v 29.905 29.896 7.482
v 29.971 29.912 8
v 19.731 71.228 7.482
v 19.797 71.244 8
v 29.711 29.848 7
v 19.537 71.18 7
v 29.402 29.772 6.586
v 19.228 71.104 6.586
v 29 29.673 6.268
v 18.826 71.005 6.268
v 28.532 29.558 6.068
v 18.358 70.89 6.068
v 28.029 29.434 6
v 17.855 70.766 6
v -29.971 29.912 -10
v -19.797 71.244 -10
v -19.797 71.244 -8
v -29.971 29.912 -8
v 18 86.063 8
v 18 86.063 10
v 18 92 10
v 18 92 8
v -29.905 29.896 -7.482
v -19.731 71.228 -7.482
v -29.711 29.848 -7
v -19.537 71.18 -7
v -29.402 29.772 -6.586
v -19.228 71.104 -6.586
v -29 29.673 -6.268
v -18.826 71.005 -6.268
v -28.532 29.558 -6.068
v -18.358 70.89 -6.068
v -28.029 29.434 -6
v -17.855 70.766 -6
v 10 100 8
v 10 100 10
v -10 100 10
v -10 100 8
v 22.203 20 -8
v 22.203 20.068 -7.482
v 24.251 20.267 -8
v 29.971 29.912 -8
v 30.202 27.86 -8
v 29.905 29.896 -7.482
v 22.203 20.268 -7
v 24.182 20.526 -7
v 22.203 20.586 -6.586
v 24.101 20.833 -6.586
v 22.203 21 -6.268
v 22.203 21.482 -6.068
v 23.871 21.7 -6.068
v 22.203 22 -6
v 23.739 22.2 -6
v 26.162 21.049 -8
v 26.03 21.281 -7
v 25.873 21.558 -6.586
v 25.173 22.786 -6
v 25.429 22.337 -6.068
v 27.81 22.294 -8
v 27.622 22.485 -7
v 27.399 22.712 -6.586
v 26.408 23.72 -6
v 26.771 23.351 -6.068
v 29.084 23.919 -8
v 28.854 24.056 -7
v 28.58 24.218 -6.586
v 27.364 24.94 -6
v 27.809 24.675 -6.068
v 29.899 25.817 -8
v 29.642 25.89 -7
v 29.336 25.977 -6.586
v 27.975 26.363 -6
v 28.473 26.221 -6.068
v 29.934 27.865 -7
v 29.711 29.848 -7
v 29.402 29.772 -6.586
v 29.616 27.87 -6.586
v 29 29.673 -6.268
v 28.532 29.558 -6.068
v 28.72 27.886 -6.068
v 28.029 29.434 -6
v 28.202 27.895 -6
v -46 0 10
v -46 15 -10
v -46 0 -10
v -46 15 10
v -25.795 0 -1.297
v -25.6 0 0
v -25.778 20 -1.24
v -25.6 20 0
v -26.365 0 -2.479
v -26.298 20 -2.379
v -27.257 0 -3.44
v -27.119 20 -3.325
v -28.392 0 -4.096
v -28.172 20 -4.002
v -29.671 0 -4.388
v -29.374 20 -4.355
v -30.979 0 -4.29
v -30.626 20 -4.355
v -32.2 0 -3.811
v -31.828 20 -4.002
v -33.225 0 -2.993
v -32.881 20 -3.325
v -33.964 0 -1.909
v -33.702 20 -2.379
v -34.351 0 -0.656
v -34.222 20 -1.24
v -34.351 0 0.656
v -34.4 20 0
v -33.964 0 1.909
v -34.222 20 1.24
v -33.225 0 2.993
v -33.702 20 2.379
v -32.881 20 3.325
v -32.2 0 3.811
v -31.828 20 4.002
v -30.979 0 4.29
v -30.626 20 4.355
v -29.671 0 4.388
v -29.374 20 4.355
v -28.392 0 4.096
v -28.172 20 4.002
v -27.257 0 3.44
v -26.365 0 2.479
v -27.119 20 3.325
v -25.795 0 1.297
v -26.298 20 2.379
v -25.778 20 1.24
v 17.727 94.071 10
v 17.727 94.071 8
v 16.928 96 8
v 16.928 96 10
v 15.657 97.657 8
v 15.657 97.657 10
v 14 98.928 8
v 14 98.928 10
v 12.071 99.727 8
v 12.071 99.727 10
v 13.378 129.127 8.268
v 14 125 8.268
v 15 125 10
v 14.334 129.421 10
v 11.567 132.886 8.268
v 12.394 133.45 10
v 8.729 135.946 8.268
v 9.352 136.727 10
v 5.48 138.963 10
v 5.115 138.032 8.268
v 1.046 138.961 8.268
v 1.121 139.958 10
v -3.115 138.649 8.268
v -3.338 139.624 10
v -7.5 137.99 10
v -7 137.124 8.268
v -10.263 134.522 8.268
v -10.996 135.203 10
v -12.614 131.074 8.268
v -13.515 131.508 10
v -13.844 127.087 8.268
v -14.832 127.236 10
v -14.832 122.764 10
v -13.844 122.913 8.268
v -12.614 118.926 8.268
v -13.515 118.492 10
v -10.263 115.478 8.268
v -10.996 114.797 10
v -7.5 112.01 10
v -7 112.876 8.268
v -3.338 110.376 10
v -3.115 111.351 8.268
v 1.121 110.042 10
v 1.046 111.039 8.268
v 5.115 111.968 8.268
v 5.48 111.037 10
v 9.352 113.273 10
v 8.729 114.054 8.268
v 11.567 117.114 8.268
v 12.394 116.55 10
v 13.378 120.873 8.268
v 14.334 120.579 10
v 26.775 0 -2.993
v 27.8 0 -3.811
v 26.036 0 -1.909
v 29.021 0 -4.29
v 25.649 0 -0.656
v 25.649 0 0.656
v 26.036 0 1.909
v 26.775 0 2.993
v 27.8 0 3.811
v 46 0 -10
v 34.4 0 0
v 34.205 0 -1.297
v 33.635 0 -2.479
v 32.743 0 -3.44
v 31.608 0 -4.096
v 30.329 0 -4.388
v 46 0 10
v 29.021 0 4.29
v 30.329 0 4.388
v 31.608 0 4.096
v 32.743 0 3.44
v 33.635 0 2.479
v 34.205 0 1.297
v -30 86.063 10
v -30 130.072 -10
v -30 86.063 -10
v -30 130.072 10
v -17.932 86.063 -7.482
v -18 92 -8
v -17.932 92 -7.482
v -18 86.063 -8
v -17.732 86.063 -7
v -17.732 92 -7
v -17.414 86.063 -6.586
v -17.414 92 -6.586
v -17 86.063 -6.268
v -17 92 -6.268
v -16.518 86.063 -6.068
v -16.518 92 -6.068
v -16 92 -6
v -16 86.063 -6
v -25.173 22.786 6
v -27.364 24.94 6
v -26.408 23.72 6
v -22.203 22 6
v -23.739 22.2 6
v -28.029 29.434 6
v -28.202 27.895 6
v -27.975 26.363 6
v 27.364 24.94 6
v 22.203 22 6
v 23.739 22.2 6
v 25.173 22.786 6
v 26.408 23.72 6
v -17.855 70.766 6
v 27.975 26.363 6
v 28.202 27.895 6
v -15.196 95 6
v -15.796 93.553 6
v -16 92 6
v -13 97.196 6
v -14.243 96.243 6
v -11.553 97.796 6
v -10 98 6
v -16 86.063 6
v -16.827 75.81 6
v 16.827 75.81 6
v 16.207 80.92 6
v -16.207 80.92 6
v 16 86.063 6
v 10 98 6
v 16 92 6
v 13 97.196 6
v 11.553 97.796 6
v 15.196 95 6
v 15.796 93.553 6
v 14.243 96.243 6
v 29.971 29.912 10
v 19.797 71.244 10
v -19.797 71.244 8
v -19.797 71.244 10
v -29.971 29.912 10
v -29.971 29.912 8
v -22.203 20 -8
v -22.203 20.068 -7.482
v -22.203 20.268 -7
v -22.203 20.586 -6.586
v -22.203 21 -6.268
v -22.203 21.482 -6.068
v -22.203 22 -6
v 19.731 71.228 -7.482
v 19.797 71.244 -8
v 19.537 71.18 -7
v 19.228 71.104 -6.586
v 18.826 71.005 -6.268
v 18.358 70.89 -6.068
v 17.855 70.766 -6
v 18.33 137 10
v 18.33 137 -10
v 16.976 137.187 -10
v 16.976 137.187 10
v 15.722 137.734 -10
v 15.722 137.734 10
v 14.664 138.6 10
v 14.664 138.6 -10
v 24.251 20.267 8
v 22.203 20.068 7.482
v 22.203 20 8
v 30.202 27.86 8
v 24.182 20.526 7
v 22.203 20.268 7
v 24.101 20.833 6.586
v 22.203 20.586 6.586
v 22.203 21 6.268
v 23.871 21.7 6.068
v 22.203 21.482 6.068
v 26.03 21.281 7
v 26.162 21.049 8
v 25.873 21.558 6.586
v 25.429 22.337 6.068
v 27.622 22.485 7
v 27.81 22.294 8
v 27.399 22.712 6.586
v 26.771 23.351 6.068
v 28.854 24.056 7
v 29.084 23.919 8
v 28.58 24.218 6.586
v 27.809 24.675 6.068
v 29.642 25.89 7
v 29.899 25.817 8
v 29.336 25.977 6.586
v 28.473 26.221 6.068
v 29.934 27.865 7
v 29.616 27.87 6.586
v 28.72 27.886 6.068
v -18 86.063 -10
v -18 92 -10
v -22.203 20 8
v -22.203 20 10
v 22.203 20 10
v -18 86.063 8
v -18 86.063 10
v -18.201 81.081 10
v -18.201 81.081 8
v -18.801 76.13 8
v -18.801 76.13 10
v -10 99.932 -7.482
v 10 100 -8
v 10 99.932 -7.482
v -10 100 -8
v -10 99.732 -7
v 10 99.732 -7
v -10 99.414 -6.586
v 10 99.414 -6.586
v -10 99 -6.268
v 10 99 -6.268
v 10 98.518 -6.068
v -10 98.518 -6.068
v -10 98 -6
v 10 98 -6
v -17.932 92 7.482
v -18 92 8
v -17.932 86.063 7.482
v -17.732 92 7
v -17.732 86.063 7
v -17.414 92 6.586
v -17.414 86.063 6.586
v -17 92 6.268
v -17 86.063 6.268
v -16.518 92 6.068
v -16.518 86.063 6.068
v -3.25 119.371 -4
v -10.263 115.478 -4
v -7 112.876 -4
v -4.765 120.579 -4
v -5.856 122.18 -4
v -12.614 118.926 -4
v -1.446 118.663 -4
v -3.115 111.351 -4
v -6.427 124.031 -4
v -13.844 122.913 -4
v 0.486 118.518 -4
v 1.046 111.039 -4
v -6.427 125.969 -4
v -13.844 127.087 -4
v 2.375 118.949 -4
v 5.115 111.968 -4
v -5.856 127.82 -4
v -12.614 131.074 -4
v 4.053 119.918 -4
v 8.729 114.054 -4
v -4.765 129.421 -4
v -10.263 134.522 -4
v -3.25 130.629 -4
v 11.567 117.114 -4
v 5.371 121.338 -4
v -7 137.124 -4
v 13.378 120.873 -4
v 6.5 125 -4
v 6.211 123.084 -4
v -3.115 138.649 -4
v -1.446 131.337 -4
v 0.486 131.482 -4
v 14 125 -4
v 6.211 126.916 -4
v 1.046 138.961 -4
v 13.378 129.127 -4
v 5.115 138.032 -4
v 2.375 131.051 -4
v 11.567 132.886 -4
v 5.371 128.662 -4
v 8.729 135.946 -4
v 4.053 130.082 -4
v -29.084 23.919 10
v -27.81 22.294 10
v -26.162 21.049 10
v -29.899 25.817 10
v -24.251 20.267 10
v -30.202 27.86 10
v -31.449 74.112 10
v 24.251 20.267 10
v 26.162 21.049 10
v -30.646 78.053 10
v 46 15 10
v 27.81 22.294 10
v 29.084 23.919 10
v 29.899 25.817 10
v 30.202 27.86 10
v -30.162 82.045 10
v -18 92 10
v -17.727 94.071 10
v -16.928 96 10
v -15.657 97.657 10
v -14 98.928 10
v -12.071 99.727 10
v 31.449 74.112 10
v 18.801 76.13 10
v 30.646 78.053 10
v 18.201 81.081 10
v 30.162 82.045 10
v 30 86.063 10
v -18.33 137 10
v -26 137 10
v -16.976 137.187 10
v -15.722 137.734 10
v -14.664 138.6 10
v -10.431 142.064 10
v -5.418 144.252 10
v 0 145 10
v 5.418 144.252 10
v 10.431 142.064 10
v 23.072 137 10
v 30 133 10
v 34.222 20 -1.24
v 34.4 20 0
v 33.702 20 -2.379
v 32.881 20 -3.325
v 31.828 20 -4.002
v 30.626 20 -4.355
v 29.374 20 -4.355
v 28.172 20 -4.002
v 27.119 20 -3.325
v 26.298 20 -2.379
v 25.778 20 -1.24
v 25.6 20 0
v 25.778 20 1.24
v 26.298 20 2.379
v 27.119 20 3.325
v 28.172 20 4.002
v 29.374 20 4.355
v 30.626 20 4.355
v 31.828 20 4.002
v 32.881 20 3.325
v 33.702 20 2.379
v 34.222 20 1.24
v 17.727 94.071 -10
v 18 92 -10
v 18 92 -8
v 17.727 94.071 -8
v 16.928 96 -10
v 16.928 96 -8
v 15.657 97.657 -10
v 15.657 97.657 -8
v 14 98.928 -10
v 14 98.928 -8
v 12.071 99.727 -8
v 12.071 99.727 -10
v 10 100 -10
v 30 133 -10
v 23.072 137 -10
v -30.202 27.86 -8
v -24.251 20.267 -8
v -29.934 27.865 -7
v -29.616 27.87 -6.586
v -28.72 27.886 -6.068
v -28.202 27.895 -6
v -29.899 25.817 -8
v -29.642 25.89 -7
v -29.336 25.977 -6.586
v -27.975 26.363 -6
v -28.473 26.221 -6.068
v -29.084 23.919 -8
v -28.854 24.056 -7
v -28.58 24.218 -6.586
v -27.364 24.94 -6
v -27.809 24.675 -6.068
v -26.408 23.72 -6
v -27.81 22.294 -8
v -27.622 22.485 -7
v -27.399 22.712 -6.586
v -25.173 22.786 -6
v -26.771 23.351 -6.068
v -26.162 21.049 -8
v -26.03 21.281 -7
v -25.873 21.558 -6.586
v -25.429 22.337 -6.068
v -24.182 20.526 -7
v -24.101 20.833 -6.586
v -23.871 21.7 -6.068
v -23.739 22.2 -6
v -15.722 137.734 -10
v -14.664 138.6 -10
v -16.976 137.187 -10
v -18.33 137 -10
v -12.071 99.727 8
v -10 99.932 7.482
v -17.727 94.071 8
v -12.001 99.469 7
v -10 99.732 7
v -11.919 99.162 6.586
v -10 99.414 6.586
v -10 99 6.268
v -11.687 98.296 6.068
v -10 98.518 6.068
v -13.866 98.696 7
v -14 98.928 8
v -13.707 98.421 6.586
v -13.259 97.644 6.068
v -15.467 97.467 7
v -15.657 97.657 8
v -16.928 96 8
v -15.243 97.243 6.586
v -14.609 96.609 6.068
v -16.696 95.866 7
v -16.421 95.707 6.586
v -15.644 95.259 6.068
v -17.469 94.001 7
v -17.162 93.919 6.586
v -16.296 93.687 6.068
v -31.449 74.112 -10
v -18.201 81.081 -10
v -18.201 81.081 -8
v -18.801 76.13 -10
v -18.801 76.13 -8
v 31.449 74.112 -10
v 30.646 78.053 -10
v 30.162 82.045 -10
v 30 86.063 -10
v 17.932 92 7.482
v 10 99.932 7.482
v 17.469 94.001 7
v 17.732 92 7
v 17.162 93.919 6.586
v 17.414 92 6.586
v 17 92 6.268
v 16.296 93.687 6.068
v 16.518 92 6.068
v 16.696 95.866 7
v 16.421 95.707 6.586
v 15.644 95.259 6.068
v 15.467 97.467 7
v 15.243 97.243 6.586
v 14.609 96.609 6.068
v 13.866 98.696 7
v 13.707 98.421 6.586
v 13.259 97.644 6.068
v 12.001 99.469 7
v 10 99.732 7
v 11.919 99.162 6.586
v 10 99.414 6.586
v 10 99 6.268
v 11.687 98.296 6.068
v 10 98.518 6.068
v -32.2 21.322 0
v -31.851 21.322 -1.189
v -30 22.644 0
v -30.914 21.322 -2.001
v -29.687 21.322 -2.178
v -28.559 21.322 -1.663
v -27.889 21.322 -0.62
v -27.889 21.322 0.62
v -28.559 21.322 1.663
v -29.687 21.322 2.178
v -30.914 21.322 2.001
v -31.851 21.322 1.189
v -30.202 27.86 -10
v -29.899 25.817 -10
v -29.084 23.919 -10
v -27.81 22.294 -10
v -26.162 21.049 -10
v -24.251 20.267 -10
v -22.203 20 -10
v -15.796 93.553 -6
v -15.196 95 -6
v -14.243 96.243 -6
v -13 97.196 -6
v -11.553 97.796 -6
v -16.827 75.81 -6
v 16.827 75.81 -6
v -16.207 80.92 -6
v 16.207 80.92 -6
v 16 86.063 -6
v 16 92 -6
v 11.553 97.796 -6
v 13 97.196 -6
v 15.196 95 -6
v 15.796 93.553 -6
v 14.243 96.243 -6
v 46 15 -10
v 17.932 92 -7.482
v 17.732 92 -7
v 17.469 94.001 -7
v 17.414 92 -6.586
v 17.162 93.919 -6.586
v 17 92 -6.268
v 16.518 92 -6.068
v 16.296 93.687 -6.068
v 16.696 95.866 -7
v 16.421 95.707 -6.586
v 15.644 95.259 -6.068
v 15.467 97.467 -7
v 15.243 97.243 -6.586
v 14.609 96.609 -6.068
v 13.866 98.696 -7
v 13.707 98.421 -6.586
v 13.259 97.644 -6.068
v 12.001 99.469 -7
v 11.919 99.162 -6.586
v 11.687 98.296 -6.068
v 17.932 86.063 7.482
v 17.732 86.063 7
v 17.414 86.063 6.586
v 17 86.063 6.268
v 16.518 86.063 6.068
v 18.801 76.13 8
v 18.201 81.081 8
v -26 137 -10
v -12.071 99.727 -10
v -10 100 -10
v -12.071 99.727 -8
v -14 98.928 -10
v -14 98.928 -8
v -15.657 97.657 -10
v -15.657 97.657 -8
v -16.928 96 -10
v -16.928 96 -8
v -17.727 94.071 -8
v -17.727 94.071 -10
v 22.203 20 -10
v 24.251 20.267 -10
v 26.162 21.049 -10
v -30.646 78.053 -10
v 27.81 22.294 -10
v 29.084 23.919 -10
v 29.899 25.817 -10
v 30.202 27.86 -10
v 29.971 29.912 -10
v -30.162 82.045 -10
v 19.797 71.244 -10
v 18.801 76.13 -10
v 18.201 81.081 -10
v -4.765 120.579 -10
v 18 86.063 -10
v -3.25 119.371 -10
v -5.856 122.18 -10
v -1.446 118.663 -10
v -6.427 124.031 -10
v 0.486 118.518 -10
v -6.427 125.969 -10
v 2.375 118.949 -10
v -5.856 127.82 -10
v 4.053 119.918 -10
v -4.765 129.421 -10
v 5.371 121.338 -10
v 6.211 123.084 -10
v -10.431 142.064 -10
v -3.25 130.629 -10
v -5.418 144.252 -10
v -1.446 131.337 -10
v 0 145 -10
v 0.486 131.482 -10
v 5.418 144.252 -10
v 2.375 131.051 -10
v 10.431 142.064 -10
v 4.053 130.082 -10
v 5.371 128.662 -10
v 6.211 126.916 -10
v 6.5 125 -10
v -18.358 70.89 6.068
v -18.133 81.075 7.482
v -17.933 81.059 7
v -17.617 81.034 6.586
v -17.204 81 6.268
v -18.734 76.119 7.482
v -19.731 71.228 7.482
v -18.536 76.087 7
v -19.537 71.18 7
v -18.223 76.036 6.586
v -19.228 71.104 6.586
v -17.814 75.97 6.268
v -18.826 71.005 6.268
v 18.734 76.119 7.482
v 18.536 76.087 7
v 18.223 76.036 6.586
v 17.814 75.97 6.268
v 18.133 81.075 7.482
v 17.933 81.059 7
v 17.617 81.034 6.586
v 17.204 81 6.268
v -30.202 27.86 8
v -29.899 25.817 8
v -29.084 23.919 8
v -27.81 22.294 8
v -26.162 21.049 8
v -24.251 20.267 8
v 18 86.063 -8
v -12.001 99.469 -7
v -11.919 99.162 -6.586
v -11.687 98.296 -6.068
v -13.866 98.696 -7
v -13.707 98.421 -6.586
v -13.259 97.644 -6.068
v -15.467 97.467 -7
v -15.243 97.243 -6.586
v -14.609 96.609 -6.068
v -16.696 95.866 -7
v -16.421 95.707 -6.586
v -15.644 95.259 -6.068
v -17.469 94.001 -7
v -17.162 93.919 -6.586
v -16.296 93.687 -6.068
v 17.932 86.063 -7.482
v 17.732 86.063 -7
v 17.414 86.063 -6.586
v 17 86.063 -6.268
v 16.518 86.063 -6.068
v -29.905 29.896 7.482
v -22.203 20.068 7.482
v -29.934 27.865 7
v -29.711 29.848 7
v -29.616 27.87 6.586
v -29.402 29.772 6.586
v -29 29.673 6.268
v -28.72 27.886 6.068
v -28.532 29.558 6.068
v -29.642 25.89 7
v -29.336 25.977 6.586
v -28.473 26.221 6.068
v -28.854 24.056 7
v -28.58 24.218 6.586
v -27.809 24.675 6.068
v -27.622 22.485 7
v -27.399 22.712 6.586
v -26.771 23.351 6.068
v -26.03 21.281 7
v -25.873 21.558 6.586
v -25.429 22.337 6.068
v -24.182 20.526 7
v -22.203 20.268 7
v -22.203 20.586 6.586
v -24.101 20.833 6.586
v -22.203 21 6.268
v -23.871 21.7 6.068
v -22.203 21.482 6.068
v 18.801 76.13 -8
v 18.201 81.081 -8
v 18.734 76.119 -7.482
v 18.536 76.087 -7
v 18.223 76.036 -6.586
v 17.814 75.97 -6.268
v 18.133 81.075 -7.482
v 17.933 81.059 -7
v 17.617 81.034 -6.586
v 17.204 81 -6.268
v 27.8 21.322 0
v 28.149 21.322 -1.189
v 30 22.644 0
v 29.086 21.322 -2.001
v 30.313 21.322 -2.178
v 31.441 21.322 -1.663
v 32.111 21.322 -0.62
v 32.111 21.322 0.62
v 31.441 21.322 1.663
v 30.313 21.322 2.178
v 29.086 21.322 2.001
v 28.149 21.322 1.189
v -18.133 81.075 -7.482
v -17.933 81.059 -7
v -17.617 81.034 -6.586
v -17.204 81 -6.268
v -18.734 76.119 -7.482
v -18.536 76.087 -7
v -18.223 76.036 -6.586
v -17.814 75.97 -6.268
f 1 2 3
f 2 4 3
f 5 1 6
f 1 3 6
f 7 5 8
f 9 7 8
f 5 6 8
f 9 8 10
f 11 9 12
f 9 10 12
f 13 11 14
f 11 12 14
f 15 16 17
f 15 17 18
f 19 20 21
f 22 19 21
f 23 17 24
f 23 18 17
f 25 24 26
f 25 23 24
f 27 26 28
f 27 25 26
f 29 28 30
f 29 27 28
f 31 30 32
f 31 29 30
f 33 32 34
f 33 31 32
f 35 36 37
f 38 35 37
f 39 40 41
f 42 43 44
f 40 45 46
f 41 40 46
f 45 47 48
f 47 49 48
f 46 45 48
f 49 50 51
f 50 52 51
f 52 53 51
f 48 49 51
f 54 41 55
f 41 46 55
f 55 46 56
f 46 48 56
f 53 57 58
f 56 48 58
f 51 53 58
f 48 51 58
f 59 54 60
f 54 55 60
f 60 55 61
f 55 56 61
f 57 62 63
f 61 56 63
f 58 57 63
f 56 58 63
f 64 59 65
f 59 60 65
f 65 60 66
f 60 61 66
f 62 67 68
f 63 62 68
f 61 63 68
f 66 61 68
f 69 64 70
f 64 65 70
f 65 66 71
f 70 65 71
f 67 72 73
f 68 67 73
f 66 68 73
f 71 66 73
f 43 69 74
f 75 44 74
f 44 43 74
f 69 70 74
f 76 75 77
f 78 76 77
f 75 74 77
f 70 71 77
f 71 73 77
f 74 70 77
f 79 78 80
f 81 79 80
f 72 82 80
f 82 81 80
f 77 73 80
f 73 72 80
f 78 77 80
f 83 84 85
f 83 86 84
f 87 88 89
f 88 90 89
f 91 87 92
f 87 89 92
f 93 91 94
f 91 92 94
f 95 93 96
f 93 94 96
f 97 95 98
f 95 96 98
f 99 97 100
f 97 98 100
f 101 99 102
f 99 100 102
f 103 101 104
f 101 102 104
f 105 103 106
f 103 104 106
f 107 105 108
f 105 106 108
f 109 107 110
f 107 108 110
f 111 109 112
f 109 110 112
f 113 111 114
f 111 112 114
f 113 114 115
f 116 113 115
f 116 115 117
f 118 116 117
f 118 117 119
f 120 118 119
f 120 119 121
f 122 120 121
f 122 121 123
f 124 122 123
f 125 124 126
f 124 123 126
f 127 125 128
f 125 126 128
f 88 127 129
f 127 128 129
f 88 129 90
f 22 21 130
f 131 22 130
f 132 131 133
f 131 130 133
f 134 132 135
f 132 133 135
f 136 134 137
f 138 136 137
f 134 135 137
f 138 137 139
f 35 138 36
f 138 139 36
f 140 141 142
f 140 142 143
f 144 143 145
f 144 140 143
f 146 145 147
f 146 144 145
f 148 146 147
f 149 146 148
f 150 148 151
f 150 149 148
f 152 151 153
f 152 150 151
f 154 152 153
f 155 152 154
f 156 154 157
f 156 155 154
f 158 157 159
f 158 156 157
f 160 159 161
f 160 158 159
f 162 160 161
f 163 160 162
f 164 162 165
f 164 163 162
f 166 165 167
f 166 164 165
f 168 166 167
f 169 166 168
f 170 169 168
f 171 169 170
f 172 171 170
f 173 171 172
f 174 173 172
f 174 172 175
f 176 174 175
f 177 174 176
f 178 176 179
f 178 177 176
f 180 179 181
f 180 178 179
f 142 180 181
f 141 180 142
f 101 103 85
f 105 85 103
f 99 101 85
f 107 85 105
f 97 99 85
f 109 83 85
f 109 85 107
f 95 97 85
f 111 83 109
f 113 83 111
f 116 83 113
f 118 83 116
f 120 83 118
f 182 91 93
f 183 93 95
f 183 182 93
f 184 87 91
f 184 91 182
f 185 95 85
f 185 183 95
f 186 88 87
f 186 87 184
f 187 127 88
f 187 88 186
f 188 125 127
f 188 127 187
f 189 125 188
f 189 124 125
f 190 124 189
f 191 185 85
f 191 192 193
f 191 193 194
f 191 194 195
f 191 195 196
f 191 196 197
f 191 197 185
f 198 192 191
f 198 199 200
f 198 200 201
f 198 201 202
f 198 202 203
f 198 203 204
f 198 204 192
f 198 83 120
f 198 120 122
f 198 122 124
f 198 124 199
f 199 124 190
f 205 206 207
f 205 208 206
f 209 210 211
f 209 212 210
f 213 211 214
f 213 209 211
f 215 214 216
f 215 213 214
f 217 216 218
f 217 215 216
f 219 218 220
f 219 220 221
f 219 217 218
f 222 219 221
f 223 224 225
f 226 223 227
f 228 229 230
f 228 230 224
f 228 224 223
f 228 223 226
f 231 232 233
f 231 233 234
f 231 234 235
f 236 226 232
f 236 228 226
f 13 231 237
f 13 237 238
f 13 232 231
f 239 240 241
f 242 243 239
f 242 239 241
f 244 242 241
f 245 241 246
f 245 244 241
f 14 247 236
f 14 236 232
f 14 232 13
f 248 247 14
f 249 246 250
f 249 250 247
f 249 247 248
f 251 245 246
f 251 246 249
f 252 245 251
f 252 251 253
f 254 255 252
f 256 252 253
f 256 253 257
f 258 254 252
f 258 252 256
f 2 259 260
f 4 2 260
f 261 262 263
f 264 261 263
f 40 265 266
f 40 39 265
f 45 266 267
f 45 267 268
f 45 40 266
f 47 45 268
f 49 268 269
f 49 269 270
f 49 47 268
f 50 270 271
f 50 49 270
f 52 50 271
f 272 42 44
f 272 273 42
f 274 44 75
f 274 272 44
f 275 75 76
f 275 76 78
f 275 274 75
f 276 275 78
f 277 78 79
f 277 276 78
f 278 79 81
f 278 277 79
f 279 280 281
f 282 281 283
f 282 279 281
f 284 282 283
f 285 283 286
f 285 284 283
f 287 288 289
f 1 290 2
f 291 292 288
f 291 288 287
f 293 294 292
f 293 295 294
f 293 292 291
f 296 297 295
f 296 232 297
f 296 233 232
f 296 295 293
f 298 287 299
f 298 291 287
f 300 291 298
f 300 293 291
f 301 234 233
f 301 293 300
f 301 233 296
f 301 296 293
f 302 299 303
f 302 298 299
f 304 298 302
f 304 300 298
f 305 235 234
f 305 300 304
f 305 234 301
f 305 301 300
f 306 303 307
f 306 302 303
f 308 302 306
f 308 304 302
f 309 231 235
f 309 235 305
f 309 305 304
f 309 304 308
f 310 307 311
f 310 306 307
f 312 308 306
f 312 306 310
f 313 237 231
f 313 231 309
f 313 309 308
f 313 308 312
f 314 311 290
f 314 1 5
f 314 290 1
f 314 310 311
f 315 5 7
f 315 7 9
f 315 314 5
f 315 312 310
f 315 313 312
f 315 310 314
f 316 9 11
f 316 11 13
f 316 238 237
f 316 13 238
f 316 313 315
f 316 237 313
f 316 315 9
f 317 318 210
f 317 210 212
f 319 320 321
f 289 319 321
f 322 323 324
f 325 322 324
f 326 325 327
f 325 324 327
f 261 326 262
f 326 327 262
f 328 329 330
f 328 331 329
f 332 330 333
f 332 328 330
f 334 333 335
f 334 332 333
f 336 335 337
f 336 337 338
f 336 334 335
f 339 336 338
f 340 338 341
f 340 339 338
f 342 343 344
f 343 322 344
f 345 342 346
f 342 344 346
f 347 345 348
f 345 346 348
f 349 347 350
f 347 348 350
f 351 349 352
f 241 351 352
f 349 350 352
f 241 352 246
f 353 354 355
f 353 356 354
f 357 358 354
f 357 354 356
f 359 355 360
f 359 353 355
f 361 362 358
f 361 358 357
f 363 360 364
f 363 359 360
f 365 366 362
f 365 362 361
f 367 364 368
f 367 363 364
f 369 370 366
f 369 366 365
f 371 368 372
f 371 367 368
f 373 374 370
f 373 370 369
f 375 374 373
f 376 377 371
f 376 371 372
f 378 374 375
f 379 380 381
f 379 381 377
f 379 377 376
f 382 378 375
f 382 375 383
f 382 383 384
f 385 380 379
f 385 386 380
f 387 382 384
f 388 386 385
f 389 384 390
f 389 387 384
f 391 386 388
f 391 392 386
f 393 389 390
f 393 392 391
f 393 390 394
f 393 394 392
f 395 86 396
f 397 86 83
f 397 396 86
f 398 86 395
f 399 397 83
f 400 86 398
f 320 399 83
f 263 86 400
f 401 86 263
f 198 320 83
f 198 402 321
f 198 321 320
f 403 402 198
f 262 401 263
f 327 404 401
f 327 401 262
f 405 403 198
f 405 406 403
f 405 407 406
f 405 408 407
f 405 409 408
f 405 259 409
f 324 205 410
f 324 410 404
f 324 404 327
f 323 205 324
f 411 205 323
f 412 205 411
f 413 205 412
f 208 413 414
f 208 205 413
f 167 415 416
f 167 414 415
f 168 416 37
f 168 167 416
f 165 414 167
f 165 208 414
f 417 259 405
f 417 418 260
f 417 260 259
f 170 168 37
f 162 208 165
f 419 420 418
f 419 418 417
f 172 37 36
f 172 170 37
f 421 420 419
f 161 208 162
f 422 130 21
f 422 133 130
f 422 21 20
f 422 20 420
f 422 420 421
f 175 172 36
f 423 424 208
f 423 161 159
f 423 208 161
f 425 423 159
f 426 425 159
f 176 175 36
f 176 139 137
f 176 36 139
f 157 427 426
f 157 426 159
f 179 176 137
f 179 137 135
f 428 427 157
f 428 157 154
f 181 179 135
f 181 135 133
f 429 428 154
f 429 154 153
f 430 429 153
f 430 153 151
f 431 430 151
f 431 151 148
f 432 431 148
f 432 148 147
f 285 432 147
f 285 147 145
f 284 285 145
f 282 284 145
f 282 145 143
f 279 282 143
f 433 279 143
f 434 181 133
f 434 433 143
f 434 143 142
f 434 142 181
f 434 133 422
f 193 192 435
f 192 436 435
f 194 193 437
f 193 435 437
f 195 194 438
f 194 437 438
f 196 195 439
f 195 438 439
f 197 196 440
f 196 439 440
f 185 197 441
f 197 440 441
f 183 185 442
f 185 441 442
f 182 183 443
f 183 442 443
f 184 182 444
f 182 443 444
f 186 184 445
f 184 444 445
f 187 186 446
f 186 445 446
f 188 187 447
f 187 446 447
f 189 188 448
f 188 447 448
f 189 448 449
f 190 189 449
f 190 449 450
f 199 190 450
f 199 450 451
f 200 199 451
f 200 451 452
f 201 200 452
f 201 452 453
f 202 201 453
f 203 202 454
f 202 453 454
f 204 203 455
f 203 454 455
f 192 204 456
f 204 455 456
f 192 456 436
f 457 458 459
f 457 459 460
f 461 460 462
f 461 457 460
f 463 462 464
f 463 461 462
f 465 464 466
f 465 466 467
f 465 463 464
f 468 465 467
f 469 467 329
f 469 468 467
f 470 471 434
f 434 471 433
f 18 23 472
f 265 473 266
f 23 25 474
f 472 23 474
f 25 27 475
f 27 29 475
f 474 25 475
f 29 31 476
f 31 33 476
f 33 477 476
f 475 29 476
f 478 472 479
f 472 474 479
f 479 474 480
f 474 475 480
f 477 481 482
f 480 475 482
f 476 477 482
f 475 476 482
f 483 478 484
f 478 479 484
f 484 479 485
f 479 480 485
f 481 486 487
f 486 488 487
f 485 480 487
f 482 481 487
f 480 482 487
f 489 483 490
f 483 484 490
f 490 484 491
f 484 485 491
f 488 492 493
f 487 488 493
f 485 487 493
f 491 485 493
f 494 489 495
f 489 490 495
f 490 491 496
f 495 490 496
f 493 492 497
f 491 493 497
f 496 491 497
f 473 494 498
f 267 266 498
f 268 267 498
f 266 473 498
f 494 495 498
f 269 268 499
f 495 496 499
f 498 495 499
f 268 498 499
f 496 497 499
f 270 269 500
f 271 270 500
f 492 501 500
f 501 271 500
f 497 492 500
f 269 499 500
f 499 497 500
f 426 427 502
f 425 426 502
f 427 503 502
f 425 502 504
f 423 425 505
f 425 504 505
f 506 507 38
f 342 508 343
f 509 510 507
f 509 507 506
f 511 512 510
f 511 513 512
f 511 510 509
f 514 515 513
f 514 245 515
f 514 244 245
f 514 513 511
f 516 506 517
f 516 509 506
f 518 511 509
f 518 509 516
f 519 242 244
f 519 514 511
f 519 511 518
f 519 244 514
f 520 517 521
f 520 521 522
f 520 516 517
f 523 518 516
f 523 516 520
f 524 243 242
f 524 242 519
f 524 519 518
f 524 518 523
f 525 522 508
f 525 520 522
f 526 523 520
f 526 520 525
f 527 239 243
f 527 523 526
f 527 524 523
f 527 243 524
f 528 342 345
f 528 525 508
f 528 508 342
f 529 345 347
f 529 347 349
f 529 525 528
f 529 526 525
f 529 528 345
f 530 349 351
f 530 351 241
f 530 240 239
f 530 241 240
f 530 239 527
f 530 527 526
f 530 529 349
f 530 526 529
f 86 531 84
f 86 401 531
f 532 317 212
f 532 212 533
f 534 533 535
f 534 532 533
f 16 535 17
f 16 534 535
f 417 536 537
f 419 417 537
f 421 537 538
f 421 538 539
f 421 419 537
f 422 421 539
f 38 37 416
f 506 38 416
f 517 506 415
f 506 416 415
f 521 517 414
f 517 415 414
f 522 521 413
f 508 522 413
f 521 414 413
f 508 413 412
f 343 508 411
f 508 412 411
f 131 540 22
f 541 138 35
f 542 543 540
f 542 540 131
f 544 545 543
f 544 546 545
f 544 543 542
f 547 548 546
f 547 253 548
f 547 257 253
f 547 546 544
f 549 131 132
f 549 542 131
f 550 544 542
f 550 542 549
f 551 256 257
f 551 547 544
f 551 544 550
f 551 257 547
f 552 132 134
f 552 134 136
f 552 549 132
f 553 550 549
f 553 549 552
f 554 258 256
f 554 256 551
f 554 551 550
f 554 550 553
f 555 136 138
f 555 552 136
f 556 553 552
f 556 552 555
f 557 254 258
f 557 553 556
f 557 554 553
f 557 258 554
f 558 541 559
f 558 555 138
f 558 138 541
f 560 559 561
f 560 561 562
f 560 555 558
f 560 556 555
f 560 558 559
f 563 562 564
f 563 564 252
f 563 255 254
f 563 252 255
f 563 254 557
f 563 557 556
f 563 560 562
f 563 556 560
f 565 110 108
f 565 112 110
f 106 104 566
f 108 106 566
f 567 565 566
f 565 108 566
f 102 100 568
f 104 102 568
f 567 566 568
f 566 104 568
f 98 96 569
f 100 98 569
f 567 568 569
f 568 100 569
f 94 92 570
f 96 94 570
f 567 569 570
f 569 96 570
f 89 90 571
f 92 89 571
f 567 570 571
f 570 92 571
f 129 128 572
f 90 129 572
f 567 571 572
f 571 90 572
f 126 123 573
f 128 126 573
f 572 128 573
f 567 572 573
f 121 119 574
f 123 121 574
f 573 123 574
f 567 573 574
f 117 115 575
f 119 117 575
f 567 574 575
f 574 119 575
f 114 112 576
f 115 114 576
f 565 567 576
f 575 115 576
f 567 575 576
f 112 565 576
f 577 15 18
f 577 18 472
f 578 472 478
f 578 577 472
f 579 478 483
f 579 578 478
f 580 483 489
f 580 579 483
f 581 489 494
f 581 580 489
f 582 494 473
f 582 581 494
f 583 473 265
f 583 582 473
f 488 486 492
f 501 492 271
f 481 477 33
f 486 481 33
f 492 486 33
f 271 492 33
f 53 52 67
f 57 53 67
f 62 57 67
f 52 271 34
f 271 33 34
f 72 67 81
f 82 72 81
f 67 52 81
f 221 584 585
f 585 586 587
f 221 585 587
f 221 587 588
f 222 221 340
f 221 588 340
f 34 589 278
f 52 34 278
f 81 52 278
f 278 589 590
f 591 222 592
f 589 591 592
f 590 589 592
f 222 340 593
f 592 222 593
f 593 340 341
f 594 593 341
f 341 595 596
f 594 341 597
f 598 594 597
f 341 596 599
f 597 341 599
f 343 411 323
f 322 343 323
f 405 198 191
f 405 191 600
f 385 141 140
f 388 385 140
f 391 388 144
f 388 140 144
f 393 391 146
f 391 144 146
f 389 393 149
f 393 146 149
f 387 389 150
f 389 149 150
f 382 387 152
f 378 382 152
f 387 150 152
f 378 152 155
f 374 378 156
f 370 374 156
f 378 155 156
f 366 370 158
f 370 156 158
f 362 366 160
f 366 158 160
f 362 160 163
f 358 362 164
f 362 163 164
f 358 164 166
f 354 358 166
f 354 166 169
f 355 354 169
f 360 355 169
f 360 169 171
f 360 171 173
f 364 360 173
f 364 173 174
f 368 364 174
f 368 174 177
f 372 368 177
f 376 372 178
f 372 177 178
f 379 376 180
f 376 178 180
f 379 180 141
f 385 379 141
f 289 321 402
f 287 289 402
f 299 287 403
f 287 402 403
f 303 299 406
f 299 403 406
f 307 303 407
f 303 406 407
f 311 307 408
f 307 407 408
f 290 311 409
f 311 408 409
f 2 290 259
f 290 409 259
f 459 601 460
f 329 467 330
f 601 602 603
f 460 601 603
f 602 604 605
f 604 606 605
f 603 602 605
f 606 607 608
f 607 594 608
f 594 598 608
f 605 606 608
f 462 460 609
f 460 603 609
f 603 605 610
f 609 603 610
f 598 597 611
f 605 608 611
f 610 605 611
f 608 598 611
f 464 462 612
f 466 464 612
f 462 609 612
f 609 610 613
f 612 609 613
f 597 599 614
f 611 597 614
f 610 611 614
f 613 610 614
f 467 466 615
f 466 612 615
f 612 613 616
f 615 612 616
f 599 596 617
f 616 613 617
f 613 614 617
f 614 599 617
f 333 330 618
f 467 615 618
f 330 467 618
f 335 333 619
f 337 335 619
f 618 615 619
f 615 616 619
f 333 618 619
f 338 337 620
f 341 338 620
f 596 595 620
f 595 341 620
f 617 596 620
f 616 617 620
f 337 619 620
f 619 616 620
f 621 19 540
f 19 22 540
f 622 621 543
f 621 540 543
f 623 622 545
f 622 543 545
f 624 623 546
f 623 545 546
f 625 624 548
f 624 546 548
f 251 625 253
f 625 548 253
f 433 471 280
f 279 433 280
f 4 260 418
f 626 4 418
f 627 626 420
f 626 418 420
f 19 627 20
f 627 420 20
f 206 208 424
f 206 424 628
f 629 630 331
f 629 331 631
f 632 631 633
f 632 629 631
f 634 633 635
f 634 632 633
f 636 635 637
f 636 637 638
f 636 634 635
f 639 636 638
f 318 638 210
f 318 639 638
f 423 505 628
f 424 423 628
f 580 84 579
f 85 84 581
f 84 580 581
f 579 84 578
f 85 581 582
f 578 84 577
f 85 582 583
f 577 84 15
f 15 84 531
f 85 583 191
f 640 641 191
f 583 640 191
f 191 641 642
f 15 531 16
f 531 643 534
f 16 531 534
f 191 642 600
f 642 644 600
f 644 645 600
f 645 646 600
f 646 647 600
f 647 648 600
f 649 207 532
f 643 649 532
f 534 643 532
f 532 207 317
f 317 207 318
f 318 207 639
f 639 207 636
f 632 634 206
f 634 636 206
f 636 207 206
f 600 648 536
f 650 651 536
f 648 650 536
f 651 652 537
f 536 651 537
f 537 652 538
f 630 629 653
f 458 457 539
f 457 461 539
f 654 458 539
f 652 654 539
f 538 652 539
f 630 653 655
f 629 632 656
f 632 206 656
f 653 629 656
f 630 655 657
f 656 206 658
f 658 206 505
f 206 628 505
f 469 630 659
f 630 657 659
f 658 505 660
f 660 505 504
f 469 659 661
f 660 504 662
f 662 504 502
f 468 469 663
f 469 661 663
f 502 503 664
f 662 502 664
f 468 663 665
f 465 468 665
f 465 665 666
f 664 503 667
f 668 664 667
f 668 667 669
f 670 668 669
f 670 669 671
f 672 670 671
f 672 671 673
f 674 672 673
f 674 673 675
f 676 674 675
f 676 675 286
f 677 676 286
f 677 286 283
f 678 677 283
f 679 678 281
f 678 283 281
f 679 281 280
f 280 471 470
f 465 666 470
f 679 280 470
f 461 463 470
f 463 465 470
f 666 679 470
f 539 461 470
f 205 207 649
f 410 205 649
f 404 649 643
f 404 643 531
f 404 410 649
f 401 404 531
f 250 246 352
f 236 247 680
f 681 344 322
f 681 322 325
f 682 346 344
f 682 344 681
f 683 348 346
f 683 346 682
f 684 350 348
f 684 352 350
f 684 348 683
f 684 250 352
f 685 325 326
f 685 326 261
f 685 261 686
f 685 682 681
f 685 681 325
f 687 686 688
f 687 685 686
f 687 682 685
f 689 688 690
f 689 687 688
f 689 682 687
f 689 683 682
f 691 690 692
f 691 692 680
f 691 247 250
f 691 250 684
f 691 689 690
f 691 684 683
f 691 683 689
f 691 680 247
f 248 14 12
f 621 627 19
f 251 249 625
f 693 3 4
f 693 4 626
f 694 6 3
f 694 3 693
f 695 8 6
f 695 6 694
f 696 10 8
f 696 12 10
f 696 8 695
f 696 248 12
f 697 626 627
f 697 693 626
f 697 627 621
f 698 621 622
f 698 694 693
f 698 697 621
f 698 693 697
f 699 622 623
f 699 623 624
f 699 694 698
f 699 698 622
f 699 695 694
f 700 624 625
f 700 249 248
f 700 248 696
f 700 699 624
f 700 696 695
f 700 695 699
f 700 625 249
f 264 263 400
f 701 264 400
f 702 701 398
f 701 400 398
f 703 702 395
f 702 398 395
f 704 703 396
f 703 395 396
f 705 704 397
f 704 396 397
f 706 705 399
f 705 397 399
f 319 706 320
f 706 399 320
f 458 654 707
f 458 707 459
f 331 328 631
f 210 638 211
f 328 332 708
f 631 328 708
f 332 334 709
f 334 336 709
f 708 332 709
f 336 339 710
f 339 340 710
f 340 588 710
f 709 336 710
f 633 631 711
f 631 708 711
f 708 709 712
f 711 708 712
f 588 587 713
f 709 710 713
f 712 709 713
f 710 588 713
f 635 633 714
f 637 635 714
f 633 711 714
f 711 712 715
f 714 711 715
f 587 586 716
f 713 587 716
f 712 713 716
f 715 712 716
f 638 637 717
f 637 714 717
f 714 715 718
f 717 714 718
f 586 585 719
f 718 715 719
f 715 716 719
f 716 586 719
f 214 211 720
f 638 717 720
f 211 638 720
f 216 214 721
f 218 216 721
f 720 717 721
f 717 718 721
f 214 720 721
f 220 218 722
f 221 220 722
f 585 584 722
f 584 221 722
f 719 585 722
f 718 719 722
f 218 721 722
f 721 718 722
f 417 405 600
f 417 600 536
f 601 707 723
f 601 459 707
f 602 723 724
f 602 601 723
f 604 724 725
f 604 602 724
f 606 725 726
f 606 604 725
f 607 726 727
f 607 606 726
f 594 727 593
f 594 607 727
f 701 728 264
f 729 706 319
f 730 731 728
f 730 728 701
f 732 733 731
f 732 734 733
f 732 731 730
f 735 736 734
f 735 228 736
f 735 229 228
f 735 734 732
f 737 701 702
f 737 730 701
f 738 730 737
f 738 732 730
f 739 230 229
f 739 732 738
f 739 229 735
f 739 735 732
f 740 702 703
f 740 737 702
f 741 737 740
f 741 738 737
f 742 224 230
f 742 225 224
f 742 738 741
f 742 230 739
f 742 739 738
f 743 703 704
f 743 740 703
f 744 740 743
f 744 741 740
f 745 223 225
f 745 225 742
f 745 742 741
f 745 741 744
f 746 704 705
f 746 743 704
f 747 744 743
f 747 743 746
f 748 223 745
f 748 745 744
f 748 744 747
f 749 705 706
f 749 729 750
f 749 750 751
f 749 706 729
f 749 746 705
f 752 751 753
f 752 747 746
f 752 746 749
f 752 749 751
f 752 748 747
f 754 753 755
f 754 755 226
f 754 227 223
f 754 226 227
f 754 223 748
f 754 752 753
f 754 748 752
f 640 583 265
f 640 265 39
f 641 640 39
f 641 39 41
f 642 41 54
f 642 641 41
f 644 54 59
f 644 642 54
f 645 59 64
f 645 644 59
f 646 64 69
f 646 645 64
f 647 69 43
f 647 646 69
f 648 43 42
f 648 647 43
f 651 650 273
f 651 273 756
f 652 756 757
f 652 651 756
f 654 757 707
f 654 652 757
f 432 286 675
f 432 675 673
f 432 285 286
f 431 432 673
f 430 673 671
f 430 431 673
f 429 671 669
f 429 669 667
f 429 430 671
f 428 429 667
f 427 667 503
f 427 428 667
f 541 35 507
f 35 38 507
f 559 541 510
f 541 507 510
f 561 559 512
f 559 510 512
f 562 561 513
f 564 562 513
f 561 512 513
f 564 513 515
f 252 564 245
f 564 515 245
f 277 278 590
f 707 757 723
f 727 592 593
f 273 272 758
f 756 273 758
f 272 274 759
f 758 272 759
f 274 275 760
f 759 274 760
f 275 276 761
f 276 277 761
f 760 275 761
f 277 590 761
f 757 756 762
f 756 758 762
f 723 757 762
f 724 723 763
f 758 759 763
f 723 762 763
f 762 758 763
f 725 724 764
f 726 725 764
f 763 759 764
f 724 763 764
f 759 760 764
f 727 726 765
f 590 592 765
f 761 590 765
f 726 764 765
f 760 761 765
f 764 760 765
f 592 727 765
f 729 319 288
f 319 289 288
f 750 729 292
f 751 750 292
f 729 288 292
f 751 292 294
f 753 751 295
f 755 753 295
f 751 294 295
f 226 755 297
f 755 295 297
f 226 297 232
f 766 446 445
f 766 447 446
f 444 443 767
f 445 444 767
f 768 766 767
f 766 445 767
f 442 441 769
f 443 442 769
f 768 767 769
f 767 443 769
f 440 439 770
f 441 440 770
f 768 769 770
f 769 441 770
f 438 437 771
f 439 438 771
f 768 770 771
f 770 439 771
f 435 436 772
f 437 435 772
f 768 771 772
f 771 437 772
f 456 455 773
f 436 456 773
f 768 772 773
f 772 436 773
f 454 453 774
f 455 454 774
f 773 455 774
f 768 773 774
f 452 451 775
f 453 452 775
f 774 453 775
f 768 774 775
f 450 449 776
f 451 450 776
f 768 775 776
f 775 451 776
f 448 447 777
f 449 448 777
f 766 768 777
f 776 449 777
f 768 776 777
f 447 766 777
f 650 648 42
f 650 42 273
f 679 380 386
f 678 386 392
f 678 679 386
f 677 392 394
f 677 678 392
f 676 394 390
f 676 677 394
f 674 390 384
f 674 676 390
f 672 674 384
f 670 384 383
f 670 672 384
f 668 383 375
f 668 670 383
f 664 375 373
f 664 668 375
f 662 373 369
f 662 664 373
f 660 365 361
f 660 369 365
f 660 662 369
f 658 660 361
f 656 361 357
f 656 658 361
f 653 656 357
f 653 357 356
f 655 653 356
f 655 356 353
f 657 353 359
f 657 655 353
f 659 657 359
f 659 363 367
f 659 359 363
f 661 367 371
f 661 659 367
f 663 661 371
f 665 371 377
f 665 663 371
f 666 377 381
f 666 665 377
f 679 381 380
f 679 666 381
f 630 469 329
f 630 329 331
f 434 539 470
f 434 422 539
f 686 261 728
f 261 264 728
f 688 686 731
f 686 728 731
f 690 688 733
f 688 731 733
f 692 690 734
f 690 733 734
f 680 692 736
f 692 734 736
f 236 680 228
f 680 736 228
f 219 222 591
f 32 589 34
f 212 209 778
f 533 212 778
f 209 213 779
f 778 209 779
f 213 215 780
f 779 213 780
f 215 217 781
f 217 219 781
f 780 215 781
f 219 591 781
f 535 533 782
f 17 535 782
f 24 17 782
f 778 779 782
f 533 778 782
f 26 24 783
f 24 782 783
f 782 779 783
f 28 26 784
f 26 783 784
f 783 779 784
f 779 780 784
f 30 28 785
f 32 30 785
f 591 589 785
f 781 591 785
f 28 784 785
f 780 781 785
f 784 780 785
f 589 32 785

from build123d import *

# Parameters (mm, degrees)
SKETCH1_R                   = 6.5
BOSS_EXTRUDE1_DEPTH         = 10
SKETCH2_R                   = 14
CUT_EXTRUDE1_DEPTH          = 14
CHAMFER1_SIZE               = 1
CHAMFER1_SIZE2              = 1.732050808
CHAMFER2_SIZE               = 4
CHAMFER2_SIZE2              = 6.92820323
CHAMFER2_PART_2_SIZE        = 4
CHAMFER2_PART_2_SIZE2       = 6.92820323
FILLET1_R                   = 5
CUT_EXTRUDE2_DEPTH          = 4
FILLET2_R                   = 2
FILLET2_OF_MIRROR1_R        = 2
M10X1_25_TAPPED_HOLE1_D     = 8.8
M10X1_25_TAPPED_HOLE1_DEPTH = 20
M10X1_25_TAPPED_HOLE1_TIP   = 2.643786724


with BuildPart() as part:
    # Sketch1 → Boss-Extrude1 (new body, symmetric)
    with BuildSketch(Plane.XY):
        with BuildLine():
            Line((-46, 0), (46, 0))
            Line((46, 0), (46, 15))
            Line((46, 15), (31.449256053, 74.112397284))
            ThreePointArc((31.449256053, 74.112397284), (30.363636327, 80.044097084), (30, 86.06334964))
            Line((30, 86.06334964), (30, 137))
            Line((30, 137), (16, 137))
            ThreePointArc((16, 137), (0, 145), (-16, 137))
            Line((-16, 137), (-30, 137))
            Line((-30, 137), (-30, 86.06334964))
            ThreePointArc((-30, 86.06334964), (-30.363636327, 80.044097084), (-31.449256053, 74.112397284))
            Line((-31.449256053, 74.112397284), (-46, 15))
            Line((-46, 15), (-46, 0))
        make_face()
        with Locations((0, 125)):
            Circle(SKETCH1_R, mode=Mode.SUBTRACT)
    extrude(amount=BOSS_EXTRUDE1_DEPTH, both=True)

    # Sketch2 → Cut-Extrude1 (cut)
    with BuildSketch(Plane.XY.offset(10)):
        with Locations((0, 125)):
            Circle(SKETCH2_R)
    extrude(amount=-CUT_EXTRUDE1_DEPTH, mode=Mode.SUBTRACT)

    # Chamfer1
    chamfer1_edges = [part.edges().sort_by_distance(p)[0] for p in [
        (-14, 125, 10),
    ]]
    chamfer1_side = [part.faces().sort_by_distance(p)[0] for p in [
        (0, 59.441099991, 10),
    ]]
    chamfer(chamfer1_edges, length=CHAMFER1_SIZE, length2=CHAMFER1_SIZE2, reference=chamfer1_side[0])

    # Chamfer2
    chamfer2_edges = [part.edges().sort_by_distance(p)[0] for p in [
        (-30, 137, 0),
    ]]
    chamfer2_side = [part.faces().sort_by_distance(p)[0] for p in [
        (-23, 137, 0),
    ]]
    chamfer(chamfer2_edges, length=CHAMFER2_SIZE, length2=CHAMFER2_SIZE2, reference=chamfer2_side[0])

    # Chamfer2 part 2
    chamfer2_part_2_edges = [part.edges().sort_by_distance(p)[0] for p in [
        (30, 137, 0),
    ]]
    chamfer2_part_2_side = [part.faces().sort_by_distance(p)[0] for p in [
        (30, 111.53167482, 0),
    ]]
    chamfer(chamfer2_part_2_edges, length=CHAMFER2_PART_2_SIZE, length2=CHAMFER2_PART_2_SIZE2, reference=chamfer2_part_2_side[0])

    # Fillet1
    fillet1_edges = [part.edges().sort_by_distance(p)[0] for p in [
        (-16, 137, 0),
        (16, 137, 0),
    ]]
    fillet(fillet1_edges, radius=FILLET1_R)

    # Sketch3 → Cut-Extrude2 (cut)
    with BuildSketch(Plane.XY.offset(10)):
        with BuildLine():
            Line((-18, 92), (-18, 86.06334964))
            ThreePointArc((-18, 86.06334964), (-18.450909046, 78.59947647), (-19.797077506, 71.244168718))
            Line((-19.797077506, 71.244168718), (-29.971112298, 29.912152377))
            ThreePointArc((-29.971112298, 29.912152377), (-28.49970745, 23.065287193), (-22.202993266, 20))
            Line((-22.202993266, 20), (22.202993266, 20))
            ThreePointArc((22.202993266, 20), (28.49970745, 23.065287193), (29.971112298, 29.912152377))
            Line((29.971112298, 29.912152377), (19.797077506, 71.244168718))
            ThreePointArc((19.797077506, 71.244168718), (18.450909046, 78.59947647), (18, 86.06334964))
            Line((18, 86.06334964), (18, 92))
            ThreePointArc((18, 92), (15.656854249, 97.656854249), (10, 100))
            Line((10, 100), (-10, 100))
            ThreePointArc((-10, 100), (-15.656854249, 97.656854249), (-18, 92))
        make_face()
    cut_extrude2 = extrude(amount=-CUT_EXTRUDE2_DEPTH, mode=Mode.SUBTRACT)

    # Fillet2
    fillet2_edges = [part.edges().sort_by_distance(p)[0] for p in [
        (28.49970745, 23.065287193, 6),
        (0, 20, 6),
        (-28.49970745, 23.065287193, 6),
        (-24.884094902, 50.578160548, 6),
        (-18.450909046, 78.59947647, 6),
        (-18, 89.03167482, 6),
        (-15.656854249, 97.656854249, 6),
        (0, 100, 6),
        (15.656854249, 97.656854249, 6),
        (18, 89.03167482, 6),
        (18.450909046, 78.59947647, 6),
        (24.884094902, 50.578160548, 6),
    ]]
    fillet(fillet2_edges, radius=FILLET2_R)

    # Mirror1: Cut-Extrude2 across plane
    add(cut_extrude2.mirror(Plane.XY), mode=Mode.SUBTRACT)

    # Fillet2 of Mirror1
    fillet2_of_mirror1_edges = [part.edges().sort_by_distance(p)[0] for p in [
        (28.49970745, 23.065287193, -6),
        (0, 20, -6),
        (-28.49970745, 23.065287193, -6),
        (-24.884094902, 50.578160548, -6),
        (-18.450909046, 78.59947647, -6),
        (-18, 89.03167482, -6),
        (-15.656854249, 97.656854249, -6),
        (0, 100, -6),
        (15.656854249, 97.656854249, -6),
        (18, 89.03167482, -6),
        (18.450909046, 78.59947647, -6),
        (24.884094902, 50.578160548, -6),
    ]]
    fillet(fillet2_of_mirror1_edges, radius=FILLET2_OF_MIRROR1_R)

    # M10x1.25 Tapped Hole1
    with Locations(Plane(origin=(0, 0, 0), x_dir=(-1, 0, 0), z_dir=(0, -1, 0))):
        with Locations((30, 0), (-30, 0)):
            Hole(M10X1_25_TAPPED_HOLE1_D / 2, depth=M10X1_25_TAPPED_HOLE1_DEPTH)
            with Locations((0, 0, -(M10X1_25_TAPPED_HOLE1_DEPTH + M10X1_25_TAPPED_HOLE1_TIP / 2))):  # 118° drill point
                Cone(0, M10X1_25_TAPPED_HOLE1_D / 2, M10X1_25_TAPPED_HOLE1_TIP, mode=Mode.SUBTRACT)


solid = part.part
